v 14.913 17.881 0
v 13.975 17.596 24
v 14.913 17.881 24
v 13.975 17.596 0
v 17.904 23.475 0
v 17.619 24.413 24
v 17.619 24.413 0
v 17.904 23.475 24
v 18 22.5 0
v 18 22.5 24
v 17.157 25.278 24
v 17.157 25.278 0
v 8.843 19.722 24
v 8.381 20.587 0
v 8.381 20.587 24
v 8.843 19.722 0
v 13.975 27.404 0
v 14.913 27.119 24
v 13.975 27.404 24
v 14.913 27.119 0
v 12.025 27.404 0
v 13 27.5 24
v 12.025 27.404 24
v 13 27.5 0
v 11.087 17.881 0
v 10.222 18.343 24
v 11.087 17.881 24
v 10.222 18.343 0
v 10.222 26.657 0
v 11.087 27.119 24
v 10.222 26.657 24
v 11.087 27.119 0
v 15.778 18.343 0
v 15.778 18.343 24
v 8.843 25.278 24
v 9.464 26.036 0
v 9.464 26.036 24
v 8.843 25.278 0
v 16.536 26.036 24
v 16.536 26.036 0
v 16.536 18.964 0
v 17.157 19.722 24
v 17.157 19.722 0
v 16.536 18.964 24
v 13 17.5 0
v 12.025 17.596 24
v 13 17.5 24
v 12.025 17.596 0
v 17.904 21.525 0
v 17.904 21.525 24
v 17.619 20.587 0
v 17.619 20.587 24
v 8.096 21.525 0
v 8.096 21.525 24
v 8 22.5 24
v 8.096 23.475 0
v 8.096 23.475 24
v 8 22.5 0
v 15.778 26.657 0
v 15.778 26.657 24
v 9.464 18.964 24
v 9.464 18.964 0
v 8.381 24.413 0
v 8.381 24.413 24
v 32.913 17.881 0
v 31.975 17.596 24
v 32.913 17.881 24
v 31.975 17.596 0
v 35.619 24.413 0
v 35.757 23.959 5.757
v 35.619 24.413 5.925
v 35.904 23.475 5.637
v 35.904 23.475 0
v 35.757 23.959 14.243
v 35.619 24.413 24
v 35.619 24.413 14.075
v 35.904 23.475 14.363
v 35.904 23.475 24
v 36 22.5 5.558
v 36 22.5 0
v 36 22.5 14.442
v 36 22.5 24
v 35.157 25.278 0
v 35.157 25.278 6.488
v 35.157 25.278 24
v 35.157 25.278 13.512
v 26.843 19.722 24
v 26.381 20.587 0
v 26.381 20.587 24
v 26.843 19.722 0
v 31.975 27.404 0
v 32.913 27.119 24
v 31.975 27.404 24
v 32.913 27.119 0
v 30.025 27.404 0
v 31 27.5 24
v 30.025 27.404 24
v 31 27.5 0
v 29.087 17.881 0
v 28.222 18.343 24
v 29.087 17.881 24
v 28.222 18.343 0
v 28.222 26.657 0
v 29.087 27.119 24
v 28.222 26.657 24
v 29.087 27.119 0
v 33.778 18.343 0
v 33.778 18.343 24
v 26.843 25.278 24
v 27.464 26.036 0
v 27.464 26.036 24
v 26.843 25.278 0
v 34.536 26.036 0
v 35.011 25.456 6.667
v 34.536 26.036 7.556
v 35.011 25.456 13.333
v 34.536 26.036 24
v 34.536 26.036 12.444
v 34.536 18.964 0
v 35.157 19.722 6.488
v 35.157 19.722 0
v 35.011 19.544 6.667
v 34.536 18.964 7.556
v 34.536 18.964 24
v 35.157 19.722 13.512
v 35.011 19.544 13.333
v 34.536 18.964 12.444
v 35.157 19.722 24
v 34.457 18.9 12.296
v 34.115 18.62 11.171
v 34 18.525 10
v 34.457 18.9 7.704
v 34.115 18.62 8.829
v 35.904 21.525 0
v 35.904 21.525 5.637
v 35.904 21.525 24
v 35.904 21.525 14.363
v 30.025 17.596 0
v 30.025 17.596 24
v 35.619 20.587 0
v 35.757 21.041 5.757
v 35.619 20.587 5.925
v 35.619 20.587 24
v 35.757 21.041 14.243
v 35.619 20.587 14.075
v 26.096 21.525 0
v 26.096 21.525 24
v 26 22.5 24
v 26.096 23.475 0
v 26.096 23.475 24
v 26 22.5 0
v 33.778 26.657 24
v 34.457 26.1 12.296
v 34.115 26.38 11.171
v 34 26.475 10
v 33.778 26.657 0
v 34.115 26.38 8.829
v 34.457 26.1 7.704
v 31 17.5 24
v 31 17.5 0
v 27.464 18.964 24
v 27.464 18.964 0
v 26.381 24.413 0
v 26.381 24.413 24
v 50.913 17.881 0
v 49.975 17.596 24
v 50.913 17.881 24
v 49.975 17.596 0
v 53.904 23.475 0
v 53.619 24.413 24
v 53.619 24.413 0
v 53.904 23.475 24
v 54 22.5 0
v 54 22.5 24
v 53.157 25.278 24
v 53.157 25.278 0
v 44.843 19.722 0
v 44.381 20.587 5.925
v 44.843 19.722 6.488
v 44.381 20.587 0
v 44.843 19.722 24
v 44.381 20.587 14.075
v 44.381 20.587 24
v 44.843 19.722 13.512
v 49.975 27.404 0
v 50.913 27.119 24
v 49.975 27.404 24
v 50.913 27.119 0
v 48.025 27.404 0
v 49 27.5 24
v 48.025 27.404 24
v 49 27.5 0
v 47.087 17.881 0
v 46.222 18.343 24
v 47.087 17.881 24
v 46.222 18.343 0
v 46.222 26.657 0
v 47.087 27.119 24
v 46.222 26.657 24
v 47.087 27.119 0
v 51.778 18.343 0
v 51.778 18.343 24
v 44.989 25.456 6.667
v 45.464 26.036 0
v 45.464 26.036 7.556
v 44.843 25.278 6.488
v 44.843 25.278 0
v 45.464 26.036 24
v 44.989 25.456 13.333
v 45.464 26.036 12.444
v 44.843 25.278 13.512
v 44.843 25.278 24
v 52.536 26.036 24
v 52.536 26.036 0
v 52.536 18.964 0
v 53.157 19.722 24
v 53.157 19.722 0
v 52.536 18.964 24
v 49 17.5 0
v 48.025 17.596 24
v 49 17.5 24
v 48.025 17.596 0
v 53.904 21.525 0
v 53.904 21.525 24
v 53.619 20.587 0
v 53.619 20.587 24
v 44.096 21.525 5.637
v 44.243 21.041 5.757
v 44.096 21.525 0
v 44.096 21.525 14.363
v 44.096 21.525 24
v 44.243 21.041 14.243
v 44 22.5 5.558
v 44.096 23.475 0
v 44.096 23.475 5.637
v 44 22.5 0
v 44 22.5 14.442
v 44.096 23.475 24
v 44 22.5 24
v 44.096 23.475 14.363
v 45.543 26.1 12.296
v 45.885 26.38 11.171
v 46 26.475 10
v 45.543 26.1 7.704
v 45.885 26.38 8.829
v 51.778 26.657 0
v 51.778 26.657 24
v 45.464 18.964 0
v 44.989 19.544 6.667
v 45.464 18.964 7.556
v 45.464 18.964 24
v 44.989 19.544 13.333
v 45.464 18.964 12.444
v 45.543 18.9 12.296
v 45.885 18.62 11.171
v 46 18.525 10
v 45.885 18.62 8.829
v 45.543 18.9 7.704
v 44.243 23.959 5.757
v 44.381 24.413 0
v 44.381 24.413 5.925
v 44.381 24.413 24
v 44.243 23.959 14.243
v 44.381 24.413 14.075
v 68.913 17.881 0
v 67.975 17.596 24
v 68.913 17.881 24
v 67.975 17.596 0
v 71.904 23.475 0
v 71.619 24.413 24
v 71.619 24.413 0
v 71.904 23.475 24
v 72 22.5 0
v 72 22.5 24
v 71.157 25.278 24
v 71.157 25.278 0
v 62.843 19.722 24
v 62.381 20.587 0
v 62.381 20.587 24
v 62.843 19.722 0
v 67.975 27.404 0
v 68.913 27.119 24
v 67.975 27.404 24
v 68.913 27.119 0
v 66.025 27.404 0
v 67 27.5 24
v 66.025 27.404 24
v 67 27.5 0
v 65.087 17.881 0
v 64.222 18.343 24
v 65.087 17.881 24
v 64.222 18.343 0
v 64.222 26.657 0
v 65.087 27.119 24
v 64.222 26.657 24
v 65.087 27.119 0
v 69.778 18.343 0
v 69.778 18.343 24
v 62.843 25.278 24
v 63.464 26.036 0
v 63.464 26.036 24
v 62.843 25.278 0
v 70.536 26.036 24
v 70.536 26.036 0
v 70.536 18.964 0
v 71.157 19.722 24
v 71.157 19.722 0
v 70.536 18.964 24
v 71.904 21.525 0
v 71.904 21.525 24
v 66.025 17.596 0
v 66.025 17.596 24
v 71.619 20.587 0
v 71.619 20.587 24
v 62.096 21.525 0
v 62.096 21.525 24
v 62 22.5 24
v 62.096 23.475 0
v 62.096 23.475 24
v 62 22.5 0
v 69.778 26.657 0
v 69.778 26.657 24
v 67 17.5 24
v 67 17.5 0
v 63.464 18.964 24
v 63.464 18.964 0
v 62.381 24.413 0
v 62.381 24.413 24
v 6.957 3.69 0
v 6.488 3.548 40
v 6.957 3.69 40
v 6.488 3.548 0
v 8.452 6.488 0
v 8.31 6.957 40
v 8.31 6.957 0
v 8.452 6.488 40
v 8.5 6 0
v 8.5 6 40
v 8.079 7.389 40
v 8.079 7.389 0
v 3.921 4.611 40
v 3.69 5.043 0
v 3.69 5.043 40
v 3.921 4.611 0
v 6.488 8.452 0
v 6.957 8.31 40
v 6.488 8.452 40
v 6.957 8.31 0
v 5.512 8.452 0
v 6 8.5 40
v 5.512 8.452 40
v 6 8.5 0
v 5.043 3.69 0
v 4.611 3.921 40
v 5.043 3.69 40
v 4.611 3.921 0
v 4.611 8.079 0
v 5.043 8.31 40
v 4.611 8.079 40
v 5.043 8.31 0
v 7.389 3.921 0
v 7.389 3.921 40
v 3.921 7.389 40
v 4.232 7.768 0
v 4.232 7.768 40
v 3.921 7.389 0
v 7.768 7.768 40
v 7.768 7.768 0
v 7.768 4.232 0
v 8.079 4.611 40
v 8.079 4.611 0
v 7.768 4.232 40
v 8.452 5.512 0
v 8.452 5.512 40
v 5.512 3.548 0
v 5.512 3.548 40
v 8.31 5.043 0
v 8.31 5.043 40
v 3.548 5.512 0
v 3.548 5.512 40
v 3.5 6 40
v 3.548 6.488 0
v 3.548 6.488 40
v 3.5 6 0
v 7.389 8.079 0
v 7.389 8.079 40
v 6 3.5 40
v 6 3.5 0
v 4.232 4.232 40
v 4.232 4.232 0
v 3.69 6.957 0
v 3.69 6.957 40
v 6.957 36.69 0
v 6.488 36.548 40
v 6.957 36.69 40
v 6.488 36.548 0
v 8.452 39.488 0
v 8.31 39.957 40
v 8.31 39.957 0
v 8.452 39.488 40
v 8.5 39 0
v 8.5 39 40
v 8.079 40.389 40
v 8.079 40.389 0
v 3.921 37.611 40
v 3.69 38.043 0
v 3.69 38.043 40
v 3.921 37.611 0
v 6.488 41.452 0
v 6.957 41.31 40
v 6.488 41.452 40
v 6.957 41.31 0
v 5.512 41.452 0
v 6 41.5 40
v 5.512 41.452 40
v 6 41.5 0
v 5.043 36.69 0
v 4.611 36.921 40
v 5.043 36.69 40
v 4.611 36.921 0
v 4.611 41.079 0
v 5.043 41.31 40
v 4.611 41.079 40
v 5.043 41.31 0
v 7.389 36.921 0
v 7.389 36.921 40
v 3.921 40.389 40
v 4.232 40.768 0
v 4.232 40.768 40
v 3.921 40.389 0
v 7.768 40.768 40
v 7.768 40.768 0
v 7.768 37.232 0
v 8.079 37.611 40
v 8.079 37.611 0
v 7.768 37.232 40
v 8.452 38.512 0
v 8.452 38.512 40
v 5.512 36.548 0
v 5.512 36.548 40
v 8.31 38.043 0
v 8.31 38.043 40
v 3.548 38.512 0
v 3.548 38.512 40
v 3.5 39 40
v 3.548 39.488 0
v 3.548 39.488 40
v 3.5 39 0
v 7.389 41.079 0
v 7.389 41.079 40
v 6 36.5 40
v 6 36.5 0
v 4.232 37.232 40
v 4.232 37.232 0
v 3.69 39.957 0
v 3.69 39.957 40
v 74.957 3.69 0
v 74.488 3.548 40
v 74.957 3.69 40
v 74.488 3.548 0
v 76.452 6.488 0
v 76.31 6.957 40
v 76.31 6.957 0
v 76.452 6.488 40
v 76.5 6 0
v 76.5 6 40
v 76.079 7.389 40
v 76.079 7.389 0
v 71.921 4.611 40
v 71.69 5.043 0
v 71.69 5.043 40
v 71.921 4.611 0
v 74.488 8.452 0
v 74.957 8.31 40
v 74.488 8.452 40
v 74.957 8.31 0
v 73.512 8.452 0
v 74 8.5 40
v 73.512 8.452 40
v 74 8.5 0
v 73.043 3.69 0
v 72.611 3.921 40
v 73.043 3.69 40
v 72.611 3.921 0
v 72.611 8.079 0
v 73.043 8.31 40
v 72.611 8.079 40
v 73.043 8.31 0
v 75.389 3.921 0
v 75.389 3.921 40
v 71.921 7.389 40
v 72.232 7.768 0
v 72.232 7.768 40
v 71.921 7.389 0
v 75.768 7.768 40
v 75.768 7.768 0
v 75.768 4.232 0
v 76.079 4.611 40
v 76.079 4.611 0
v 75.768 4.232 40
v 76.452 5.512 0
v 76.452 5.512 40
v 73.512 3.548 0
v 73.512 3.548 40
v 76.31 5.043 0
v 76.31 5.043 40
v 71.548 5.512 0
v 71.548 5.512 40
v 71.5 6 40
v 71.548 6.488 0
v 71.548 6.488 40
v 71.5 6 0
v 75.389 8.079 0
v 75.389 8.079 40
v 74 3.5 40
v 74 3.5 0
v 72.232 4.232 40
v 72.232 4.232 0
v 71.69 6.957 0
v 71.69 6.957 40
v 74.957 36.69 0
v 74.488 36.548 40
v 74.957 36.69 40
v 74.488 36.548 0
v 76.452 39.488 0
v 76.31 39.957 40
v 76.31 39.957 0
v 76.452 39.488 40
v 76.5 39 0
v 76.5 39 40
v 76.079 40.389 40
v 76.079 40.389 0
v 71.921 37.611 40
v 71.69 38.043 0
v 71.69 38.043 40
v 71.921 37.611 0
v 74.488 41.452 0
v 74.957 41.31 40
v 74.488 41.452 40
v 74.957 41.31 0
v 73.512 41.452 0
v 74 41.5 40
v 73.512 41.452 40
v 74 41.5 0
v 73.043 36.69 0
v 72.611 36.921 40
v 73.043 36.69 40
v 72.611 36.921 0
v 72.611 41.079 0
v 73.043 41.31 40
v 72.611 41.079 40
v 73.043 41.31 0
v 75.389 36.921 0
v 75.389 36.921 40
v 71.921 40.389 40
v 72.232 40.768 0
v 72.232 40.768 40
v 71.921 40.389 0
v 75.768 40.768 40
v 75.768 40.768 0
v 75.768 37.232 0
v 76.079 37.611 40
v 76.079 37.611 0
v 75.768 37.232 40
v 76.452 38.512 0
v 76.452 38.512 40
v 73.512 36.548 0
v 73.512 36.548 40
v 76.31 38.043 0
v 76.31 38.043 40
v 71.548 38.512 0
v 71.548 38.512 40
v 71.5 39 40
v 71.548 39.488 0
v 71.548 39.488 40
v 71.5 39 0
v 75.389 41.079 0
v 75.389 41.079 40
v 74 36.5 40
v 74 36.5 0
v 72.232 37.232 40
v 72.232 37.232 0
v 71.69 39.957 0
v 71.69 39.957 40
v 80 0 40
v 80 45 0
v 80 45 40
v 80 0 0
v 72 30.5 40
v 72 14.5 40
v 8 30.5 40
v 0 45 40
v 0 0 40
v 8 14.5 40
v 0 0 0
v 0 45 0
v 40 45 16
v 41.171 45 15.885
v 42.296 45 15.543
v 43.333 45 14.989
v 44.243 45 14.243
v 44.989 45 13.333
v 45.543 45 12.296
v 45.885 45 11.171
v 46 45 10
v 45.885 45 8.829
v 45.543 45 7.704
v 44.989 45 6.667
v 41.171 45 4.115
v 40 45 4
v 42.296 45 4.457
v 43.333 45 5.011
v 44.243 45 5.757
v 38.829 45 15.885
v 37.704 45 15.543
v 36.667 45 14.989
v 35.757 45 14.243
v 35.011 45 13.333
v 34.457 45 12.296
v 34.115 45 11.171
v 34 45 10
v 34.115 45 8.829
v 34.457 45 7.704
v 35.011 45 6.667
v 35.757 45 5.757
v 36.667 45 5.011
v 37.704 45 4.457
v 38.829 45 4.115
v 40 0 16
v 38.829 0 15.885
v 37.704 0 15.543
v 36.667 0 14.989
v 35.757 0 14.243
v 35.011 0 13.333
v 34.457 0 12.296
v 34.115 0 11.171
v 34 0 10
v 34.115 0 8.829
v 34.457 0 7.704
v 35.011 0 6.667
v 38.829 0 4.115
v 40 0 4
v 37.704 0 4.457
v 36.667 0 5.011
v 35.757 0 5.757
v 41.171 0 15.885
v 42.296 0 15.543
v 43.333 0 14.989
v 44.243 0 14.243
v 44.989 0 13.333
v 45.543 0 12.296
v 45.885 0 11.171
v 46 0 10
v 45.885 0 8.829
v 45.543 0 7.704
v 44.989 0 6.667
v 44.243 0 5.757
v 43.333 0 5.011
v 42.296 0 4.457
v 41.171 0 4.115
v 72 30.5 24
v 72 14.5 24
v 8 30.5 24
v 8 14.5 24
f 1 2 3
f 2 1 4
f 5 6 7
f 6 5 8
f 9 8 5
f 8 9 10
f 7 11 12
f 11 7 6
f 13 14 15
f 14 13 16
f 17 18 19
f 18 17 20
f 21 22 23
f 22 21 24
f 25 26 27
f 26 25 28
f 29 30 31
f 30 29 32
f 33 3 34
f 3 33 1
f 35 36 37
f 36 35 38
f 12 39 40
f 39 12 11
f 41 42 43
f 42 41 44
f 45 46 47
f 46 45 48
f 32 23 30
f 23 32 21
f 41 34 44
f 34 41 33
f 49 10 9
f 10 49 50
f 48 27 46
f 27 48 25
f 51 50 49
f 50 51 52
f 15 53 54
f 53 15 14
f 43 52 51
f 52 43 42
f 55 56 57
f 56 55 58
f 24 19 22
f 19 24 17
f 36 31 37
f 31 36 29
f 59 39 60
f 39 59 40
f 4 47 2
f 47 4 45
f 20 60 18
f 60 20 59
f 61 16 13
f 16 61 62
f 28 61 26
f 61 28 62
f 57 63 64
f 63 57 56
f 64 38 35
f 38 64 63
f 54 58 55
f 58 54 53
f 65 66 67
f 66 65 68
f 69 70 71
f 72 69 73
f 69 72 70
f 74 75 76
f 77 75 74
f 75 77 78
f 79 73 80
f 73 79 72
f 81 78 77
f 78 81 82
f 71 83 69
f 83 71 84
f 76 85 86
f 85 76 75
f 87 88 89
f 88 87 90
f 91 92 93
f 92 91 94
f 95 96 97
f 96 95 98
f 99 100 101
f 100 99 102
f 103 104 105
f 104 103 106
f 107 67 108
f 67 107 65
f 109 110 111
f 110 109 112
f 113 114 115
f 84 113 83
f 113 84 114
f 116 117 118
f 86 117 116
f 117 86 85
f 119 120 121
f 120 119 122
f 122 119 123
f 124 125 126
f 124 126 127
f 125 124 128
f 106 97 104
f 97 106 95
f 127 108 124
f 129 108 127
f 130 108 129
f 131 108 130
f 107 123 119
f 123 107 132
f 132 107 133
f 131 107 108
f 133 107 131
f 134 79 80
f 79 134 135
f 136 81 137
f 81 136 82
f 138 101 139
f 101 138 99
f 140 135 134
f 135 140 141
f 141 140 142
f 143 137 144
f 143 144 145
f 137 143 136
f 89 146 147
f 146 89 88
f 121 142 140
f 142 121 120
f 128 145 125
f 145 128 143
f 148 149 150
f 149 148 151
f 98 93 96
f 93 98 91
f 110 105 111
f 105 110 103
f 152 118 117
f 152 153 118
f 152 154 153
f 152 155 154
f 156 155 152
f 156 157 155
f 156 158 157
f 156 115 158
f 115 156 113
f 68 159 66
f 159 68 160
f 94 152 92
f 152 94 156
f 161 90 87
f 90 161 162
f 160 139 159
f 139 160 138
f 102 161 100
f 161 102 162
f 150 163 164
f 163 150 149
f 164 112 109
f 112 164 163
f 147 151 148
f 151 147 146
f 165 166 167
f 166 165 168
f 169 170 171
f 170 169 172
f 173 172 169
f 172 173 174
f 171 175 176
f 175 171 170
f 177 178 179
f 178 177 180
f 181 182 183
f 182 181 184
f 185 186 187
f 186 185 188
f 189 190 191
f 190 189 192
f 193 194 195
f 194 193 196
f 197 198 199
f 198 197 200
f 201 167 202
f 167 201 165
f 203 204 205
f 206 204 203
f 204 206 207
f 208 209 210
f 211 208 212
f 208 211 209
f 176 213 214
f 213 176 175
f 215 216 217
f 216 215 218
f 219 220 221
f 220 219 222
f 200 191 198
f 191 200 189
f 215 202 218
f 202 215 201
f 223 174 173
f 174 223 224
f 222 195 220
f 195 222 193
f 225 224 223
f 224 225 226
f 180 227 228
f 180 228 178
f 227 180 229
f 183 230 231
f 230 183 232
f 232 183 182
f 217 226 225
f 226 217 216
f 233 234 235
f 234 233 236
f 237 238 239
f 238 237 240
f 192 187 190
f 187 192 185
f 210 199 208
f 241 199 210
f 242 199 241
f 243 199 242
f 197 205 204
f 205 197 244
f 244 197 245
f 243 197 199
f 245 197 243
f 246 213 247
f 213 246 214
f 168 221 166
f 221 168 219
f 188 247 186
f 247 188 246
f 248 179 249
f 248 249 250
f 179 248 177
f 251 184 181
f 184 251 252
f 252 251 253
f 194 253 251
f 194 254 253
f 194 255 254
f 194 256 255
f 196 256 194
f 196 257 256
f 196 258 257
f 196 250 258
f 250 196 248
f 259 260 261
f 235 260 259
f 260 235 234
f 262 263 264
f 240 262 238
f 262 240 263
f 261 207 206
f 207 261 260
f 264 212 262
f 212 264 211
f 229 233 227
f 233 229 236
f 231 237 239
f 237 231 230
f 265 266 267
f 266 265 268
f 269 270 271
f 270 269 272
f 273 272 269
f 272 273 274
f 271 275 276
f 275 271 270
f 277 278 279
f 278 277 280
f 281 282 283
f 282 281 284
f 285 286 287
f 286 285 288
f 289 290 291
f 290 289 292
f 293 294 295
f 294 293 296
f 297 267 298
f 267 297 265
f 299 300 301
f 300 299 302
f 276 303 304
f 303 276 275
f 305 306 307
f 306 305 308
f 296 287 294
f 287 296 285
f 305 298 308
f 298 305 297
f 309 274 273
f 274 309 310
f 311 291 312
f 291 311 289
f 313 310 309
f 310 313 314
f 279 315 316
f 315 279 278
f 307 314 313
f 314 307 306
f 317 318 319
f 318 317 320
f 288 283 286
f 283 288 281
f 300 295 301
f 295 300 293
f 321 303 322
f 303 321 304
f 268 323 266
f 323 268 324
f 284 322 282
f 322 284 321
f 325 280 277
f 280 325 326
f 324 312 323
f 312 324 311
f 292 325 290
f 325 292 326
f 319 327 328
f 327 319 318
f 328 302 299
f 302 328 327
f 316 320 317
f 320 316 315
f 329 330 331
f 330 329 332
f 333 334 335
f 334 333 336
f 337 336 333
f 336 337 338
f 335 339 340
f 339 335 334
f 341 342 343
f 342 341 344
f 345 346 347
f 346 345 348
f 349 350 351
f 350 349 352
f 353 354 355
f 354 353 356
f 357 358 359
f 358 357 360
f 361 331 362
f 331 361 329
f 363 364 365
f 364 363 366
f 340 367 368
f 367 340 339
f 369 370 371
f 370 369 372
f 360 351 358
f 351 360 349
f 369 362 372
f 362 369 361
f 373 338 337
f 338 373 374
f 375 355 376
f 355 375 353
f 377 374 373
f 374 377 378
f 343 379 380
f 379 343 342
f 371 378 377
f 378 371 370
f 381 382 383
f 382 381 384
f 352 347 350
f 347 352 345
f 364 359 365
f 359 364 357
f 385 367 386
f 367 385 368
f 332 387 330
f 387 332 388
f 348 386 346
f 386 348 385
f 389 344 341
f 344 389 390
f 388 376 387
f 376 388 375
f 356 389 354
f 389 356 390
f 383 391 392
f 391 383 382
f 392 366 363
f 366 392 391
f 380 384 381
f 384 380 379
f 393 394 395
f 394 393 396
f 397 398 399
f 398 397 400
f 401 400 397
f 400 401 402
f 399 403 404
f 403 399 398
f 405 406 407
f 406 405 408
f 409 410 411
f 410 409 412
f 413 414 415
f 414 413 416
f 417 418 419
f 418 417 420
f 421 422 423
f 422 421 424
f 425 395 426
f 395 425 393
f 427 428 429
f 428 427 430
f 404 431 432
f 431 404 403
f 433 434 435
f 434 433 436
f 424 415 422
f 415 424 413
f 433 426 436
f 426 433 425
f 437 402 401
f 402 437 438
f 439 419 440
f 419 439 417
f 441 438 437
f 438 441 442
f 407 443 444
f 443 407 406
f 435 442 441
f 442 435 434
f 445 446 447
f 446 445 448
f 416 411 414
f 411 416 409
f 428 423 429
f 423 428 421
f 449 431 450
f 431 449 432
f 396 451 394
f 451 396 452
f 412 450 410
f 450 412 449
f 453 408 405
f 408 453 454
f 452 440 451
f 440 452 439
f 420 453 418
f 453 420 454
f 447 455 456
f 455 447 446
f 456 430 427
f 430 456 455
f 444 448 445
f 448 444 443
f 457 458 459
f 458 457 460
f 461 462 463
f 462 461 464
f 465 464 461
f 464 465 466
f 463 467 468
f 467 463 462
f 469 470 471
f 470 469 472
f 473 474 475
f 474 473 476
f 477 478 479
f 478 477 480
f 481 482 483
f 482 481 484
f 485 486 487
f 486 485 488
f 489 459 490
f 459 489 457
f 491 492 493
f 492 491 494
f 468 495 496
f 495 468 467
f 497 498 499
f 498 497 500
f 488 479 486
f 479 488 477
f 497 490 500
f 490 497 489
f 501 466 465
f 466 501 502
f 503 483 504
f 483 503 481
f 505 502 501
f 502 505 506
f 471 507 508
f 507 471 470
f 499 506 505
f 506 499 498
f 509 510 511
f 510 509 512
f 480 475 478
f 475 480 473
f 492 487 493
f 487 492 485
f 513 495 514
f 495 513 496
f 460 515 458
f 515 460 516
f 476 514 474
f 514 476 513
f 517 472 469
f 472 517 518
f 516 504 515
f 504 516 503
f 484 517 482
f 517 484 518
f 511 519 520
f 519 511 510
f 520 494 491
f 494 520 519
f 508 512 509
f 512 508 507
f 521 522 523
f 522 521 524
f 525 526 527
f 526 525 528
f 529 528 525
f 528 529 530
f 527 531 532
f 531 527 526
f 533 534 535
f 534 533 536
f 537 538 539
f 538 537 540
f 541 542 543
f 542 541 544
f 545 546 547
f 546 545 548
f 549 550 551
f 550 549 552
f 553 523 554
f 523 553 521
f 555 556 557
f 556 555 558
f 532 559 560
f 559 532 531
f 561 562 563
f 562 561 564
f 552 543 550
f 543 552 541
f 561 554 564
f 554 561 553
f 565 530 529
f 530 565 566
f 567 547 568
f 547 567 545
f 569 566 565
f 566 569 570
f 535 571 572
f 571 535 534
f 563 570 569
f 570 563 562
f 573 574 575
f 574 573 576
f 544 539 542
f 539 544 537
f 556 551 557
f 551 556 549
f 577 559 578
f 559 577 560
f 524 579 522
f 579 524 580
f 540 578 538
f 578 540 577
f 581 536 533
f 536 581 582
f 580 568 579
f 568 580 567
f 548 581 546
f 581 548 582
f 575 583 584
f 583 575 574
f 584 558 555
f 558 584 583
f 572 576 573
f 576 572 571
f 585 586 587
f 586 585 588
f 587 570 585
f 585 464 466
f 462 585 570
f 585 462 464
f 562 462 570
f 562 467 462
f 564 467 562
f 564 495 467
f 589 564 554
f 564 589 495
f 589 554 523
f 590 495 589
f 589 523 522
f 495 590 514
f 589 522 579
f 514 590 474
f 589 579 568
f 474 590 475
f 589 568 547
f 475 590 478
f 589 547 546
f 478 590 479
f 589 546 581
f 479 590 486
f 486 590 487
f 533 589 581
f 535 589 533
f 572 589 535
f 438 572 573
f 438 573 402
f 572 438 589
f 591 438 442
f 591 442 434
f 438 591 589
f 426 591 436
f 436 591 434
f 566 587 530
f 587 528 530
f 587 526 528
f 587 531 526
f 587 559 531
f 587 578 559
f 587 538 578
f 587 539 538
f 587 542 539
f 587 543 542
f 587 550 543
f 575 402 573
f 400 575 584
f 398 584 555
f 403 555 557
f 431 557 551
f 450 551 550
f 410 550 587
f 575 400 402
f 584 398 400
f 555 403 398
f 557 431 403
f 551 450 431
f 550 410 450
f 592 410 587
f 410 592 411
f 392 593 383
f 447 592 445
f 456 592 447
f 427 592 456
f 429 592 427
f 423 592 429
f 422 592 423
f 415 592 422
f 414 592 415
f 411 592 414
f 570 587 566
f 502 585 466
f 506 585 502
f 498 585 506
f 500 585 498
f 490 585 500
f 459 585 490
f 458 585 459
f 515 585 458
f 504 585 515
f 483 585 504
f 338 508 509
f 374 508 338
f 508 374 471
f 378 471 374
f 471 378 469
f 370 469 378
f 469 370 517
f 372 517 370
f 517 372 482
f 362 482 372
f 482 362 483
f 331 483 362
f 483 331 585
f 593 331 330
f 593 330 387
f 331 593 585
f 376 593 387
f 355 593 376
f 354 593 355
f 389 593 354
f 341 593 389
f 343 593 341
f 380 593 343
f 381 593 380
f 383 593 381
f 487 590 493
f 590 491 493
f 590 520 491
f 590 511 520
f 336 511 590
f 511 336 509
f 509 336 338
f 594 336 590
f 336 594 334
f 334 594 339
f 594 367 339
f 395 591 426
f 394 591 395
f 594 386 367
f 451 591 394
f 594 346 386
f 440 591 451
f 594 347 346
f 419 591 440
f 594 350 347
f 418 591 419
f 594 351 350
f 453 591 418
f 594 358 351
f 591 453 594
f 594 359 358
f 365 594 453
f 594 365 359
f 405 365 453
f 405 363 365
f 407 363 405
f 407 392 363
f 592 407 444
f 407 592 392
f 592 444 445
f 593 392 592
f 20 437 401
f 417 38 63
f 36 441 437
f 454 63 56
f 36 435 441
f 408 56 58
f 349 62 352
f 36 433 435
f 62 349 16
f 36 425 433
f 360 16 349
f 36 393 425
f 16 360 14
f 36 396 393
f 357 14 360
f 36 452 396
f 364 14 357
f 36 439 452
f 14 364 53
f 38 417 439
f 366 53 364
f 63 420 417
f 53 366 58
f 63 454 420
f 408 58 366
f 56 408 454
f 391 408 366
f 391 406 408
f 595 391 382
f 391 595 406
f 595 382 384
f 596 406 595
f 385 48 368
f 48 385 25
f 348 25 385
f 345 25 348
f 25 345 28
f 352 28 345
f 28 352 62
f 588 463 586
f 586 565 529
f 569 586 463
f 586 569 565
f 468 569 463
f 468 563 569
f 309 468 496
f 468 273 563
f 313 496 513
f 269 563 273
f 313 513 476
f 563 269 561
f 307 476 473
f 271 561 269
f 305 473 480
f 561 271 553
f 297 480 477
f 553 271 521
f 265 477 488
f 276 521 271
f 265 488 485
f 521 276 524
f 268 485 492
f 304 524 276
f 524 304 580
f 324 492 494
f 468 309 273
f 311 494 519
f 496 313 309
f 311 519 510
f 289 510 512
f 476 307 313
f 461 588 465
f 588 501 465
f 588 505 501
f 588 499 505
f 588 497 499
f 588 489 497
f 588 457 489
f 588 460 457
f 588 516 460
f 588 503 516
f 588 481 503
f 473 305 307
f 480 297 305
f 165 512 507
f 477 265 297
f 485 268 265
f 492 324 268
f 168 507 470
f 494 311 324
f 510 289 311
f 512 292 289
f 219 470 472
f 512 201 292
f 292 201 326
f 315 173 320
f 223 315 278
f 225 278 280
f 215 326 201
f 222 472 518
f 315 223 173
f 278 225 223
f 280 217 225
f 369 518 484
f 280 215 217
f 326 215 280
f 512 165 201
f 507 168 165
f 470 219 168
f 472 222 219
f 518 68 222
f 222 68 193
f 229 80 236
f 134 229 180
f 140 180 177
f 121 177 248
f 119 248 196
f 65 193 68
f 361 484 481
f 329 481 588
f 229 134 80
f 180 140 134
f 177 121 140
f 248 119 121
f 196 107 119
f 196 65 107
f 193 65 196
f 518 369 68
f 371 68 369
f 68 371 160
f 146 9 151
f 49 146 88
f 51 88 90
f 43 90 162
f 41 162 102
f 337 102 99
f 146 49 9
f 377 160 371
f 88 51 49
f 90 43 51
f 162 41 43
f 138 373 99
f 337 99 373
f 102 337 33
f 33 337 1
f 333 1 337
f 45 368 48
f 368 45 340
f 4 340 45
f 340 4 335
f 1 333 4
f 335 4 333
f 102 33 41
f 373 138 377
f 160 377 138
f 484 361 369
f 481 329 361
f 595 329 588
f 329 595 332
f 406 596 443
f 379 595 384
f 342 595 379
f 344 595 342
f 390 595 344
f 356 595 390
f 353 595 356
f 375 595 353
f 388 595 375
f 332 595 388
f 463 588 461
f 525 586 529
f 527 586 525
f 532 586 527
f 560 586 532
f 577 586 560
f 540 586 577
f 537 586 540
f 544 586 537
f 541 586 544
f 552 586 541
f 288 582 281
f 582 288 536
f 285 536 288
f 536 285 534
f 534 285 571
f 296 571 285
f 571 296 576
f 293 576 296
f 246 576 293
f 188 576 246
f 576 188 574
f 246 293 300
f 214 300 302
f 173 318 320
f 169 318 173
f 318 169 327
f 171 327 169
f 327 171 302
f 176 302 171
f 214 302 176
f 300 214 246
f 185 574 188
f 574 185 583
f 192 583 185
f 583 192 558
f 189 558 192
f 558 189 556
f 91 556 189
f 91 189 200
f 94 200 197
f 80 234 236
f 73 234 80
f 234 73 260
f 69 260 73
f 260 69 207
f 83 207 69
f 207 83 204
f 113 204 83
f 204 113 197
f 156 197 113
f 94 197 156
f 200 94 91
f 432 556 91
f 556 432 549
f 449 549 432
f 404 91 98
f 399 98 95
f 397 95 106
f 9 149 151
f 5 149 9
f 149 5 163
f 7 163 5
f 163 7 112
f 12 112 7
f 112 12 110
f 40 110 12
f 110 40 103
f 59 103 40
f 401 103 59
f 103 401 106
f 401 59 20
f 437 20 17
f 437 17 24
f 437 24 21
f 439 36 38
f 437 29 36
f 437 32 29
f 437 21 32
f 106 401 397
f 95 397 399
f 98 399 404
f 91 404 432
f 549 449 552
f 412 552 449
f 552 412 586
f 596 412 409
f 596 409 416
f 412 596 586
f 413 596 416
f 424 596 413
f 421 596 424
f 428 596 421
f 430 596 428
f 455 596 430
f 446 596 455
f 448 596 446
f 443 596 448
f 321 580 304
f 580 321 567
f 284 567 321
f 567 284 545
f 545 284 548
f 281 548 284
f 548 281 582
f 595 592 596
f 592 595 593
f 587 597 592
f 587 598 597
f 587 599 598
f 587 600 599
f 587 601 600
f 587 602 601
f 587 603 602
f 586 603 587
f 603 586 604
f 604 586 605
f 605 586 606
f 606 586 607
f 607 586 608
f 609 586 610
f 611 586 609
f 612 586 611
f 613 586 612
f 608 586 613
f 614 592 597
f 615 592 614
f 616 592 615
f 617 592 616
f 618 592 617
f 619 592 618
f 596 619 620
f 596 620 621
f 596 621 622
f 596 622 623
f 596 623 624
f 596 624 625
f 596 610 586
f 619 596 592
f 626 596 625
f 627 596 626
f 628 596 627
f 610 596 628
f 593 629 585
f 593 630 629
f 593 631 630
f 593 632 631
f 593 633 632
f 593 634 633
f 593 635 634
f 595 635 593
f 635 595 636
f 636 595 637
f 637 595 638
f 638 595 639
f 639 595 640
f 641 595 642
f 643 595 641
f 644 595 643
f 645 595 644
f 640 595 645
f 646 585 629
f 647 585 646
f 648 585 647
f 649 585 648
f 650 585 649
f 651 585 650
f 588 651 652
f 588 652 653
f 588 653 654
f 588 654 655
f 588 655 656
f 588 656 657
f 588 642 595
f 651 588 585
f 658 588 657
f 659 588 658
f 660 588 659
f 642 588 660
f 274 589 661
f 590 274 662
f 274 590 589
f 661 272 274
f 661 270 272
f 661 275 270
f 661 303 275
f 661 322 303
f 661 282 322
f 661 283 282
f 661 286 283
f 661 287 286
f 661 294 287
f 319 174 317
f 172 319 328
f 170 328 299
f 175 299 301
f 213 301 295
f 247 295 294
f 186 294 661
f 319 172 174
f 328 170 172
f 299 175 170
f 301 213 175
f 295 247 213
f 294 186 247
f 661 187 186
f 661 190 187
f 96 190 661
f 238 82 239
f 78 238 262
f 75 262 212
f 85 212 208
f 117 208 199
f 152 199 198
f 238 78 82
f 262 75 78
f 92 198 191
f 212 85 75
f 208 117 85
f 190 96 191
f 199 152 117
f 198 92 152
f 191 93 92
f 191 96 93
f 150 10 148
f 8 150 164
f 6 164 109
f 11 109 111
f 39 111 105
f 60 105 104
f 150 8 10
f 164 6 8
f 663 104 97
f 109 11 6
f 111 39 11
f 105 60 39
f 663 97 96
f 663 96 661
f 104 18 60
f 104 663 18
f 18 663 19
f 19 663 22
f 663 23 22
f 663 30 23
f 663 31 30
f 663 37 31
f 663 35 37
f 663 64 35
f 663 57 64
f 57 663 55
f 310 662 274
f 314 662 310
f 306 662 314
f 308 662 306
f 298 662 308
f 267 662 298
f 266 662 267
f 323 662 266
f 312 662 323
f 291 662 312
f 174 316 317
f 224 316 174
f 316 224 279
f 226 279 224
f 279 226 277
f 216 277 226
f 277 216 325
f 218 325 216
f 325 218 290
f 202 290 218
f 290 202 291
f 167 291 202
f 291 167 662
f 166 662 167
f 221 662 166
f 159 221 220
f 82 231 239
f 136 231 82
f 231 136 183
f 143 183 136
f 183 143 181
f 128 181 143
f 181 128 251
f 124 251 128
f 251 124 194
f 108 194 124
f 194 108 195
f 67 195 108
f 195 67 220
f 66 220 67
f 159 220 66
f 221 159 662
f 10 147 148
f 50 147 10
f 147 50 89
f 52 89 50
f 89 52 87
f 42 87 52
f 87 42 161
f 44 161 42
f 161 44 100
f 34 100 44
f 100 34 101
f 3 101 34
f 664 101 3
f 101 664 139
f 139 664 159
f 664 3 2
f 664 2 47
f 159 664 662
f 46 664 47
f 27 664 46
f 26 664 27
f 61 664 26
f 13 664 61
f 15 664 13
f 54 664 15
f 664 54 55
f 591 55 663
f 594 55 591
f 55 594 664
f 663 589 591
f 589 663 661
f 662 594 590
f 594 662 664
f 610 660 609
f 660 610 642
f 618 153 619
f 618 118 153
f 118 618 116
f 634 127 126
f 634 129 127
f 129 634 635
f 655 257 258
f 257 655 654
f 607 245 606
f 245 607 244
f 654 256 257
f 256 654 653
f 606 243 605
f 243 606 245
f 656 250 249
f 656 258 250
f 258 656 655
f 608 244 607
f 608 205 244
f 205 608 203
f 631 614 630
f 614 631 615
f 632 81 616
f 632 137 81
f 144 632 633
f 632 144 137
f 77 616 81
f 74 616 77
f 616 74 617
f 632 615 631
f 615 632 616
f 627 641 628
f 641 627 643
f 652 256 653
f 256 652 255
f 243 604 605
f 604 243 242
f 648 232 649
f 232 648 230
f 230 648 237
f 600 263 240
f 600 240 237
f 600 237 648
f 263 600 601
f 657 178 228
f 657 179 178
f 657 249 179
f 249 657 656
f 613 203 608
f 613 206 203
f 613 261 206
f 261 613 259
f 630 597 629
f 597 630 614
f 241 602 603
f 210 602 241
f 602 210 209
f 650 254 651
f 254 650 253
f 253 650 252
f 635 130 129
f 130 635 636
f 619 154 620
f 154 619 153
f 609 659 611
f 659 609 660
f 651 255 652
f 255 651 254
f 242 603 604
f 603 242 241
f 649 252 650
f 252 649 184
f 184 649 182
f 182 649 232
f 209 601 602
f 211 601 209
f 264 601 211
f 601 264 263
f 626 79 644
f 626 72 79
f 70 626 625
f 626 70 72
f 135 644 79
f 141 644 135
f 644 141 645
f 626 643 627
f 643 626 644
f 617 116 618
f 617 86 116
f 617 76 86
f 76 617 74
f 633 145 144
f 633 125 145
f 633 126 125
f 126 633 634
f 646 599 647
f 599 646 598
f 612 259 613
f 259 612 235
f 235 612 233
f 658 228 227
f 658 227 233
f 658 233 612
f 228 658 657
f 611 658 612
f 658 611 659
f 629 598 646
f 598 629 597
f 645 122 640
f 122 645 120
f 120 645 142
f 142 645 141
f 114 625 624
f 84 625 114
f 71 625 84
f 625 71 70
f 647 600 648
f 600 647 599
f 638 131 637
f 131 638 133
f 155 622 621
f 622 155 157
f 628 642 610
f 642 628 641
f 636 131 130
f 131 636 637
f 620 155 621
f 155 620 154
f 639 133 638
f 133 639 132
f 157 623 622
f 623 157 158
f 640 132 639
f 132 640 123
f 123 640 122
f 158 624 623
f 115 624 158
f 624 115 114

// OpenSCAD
$fn = 32;

// ----------------------------------------------------------------------
// Manifold block: side_outlet manifold
// ----------------------------------------------------------------------

// --- parameters (mm) ---
block_l = 80;             // block length, X
block_w = 45;             // block width, Y
block_h = 40;             // block height, Z
port_d = 10;              // port bore diameter
port_pitch = 18;          // port pitch along X
gallery_d = 16;           // top gallery width, Y
gallery_depth = 16;       // gallery pocket depth
wall_p = 8;               // gallery end wall thickness, X
mnt_d = 5;                // mounting hole diameter
mnt_in = 6;               // mounting hole inset from the edges
out_d = 12;               // outlet bore diameter
out_z = 10;               // outlet axis height

n_ports = 4;  // ports in the row
port_x0 = (block_l - (n_ports - 1) * port_pitch) / 2;  // first port X

difference() {
  cube([block_l, block_w, block_h]);
  for (i = [0 : n_ports - 1])
    translate([port_x0 + i * port_pitch, block_w / 2, -1])
      cylinder(h = block_h + 2, d = port_d);
  translate([wall_p, block_w / 2 - gallery_d / 2, block_h - gallery_depth])
    cube([block_l - 2 * wall_p, gallery_d, gallery_depth + 1]);
  for (cx = [mnt_in, block_l - mnt_in])
    for (cy = [mnt_in, block_w - mnt_in])
      translate([cx, cy, -1]) cylinder(h = block_h + 2, d = mnt_d);
  translate([block_l / 2, -1, out_z]) rotate([-90, 0, 0])
    cylinder(h = block_w + 2, d = out_d);
}
